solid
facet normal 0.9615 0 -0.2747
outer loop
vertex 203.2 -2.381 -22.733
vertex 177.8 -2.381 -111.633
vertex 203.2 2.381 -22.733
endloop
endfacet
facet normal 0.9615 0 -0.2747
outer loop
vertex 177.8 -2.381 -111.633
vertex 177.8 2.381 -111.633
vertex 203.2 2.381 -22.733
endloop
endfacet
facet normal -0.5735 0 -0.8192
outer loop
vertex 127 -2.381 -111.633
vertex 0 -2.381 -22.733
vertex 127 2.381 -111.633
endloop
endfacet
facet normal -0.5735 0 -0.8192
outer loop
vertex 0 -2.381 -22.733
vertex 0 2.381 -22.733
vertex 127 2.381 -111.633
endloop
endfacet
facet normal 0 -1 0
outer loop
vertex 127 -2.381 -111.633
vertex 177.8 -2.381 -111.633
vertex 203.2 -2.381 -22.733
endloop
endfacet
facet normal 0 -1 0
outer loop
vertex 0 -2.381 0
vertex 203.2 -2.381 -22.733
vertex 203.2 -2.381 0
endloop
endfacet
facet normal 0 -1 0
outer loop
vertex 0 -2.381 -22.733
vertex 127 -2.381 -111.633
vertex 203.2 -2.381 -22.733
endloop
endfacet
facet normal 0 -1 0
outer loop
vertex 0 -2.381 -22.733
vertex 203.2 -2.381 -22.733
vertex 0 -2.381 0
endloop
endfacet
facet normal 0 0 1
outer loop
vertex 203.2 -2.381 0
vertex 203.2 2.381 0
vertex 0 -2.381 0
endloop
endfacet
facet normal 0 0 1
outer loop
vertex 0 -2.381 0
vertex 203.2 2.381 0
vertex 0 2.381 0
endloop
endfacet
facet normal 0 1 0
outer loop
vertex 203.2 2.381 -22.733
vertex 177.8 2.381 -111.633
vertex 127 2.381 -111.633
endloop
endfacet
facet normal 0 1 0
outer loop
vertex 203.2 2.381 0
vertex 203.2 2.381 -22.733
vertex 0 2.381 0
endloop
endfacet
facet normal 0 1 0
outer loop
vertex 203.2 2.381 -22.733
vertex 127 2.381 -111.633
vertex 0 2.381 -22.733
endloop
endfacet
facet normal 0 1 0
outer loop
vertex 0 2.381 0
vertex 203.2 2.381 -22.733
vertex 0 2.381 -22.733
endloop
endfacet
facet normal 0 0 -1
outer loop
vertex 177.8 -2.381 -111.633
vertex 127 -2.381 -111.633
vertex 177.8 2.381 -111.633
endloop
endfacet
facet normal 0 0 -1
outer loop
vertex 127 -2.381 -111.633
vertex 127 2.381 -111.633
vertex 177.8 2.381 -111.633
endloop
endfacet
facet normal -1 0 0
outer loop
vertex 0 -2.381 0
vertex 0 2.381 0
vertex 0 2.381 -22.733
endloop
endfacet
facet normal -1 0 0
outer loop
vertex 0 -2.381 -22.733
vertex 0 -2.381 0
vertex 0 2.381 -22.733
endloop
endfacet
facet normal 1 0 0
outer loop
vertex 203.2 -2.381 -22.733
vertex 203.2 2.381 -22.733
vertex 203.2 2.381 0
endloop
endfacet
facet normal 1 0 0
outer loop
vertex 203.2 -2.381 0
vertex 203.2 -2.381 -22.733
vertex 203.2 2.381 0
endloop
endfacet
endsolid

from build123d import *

# Parameters (mm, degrees)
BOSS_EXTRUDE1_DEPTH      = 2.38125
BOSS_EXTRUDE1_DEPTH_BACK = 2.38125


with BuildPart() as part:
    # Sketch1 → Boss-Extrude1 (new, two sides: drawn at the far end of the back side and taken through both)
    with BuildSketch(Plane(origin=(0, 0, 0), x_dir=(1, 0, 0), z_dir=(0, 1, 0)).offset(-BOSS_EXTRUDE1_DEPTH_BACK)):
        Polygon((0, 0), (0, 22.733), (127, 111.633), (177.8, 111.633), (203.2, 22.733), (203.2, 0), align=None)
    extrude(amount=BOSS_EXTRUDE1_DEPTH + BOSS_EXTRUDE1_DEPTH_BACK)


solid = part.part
